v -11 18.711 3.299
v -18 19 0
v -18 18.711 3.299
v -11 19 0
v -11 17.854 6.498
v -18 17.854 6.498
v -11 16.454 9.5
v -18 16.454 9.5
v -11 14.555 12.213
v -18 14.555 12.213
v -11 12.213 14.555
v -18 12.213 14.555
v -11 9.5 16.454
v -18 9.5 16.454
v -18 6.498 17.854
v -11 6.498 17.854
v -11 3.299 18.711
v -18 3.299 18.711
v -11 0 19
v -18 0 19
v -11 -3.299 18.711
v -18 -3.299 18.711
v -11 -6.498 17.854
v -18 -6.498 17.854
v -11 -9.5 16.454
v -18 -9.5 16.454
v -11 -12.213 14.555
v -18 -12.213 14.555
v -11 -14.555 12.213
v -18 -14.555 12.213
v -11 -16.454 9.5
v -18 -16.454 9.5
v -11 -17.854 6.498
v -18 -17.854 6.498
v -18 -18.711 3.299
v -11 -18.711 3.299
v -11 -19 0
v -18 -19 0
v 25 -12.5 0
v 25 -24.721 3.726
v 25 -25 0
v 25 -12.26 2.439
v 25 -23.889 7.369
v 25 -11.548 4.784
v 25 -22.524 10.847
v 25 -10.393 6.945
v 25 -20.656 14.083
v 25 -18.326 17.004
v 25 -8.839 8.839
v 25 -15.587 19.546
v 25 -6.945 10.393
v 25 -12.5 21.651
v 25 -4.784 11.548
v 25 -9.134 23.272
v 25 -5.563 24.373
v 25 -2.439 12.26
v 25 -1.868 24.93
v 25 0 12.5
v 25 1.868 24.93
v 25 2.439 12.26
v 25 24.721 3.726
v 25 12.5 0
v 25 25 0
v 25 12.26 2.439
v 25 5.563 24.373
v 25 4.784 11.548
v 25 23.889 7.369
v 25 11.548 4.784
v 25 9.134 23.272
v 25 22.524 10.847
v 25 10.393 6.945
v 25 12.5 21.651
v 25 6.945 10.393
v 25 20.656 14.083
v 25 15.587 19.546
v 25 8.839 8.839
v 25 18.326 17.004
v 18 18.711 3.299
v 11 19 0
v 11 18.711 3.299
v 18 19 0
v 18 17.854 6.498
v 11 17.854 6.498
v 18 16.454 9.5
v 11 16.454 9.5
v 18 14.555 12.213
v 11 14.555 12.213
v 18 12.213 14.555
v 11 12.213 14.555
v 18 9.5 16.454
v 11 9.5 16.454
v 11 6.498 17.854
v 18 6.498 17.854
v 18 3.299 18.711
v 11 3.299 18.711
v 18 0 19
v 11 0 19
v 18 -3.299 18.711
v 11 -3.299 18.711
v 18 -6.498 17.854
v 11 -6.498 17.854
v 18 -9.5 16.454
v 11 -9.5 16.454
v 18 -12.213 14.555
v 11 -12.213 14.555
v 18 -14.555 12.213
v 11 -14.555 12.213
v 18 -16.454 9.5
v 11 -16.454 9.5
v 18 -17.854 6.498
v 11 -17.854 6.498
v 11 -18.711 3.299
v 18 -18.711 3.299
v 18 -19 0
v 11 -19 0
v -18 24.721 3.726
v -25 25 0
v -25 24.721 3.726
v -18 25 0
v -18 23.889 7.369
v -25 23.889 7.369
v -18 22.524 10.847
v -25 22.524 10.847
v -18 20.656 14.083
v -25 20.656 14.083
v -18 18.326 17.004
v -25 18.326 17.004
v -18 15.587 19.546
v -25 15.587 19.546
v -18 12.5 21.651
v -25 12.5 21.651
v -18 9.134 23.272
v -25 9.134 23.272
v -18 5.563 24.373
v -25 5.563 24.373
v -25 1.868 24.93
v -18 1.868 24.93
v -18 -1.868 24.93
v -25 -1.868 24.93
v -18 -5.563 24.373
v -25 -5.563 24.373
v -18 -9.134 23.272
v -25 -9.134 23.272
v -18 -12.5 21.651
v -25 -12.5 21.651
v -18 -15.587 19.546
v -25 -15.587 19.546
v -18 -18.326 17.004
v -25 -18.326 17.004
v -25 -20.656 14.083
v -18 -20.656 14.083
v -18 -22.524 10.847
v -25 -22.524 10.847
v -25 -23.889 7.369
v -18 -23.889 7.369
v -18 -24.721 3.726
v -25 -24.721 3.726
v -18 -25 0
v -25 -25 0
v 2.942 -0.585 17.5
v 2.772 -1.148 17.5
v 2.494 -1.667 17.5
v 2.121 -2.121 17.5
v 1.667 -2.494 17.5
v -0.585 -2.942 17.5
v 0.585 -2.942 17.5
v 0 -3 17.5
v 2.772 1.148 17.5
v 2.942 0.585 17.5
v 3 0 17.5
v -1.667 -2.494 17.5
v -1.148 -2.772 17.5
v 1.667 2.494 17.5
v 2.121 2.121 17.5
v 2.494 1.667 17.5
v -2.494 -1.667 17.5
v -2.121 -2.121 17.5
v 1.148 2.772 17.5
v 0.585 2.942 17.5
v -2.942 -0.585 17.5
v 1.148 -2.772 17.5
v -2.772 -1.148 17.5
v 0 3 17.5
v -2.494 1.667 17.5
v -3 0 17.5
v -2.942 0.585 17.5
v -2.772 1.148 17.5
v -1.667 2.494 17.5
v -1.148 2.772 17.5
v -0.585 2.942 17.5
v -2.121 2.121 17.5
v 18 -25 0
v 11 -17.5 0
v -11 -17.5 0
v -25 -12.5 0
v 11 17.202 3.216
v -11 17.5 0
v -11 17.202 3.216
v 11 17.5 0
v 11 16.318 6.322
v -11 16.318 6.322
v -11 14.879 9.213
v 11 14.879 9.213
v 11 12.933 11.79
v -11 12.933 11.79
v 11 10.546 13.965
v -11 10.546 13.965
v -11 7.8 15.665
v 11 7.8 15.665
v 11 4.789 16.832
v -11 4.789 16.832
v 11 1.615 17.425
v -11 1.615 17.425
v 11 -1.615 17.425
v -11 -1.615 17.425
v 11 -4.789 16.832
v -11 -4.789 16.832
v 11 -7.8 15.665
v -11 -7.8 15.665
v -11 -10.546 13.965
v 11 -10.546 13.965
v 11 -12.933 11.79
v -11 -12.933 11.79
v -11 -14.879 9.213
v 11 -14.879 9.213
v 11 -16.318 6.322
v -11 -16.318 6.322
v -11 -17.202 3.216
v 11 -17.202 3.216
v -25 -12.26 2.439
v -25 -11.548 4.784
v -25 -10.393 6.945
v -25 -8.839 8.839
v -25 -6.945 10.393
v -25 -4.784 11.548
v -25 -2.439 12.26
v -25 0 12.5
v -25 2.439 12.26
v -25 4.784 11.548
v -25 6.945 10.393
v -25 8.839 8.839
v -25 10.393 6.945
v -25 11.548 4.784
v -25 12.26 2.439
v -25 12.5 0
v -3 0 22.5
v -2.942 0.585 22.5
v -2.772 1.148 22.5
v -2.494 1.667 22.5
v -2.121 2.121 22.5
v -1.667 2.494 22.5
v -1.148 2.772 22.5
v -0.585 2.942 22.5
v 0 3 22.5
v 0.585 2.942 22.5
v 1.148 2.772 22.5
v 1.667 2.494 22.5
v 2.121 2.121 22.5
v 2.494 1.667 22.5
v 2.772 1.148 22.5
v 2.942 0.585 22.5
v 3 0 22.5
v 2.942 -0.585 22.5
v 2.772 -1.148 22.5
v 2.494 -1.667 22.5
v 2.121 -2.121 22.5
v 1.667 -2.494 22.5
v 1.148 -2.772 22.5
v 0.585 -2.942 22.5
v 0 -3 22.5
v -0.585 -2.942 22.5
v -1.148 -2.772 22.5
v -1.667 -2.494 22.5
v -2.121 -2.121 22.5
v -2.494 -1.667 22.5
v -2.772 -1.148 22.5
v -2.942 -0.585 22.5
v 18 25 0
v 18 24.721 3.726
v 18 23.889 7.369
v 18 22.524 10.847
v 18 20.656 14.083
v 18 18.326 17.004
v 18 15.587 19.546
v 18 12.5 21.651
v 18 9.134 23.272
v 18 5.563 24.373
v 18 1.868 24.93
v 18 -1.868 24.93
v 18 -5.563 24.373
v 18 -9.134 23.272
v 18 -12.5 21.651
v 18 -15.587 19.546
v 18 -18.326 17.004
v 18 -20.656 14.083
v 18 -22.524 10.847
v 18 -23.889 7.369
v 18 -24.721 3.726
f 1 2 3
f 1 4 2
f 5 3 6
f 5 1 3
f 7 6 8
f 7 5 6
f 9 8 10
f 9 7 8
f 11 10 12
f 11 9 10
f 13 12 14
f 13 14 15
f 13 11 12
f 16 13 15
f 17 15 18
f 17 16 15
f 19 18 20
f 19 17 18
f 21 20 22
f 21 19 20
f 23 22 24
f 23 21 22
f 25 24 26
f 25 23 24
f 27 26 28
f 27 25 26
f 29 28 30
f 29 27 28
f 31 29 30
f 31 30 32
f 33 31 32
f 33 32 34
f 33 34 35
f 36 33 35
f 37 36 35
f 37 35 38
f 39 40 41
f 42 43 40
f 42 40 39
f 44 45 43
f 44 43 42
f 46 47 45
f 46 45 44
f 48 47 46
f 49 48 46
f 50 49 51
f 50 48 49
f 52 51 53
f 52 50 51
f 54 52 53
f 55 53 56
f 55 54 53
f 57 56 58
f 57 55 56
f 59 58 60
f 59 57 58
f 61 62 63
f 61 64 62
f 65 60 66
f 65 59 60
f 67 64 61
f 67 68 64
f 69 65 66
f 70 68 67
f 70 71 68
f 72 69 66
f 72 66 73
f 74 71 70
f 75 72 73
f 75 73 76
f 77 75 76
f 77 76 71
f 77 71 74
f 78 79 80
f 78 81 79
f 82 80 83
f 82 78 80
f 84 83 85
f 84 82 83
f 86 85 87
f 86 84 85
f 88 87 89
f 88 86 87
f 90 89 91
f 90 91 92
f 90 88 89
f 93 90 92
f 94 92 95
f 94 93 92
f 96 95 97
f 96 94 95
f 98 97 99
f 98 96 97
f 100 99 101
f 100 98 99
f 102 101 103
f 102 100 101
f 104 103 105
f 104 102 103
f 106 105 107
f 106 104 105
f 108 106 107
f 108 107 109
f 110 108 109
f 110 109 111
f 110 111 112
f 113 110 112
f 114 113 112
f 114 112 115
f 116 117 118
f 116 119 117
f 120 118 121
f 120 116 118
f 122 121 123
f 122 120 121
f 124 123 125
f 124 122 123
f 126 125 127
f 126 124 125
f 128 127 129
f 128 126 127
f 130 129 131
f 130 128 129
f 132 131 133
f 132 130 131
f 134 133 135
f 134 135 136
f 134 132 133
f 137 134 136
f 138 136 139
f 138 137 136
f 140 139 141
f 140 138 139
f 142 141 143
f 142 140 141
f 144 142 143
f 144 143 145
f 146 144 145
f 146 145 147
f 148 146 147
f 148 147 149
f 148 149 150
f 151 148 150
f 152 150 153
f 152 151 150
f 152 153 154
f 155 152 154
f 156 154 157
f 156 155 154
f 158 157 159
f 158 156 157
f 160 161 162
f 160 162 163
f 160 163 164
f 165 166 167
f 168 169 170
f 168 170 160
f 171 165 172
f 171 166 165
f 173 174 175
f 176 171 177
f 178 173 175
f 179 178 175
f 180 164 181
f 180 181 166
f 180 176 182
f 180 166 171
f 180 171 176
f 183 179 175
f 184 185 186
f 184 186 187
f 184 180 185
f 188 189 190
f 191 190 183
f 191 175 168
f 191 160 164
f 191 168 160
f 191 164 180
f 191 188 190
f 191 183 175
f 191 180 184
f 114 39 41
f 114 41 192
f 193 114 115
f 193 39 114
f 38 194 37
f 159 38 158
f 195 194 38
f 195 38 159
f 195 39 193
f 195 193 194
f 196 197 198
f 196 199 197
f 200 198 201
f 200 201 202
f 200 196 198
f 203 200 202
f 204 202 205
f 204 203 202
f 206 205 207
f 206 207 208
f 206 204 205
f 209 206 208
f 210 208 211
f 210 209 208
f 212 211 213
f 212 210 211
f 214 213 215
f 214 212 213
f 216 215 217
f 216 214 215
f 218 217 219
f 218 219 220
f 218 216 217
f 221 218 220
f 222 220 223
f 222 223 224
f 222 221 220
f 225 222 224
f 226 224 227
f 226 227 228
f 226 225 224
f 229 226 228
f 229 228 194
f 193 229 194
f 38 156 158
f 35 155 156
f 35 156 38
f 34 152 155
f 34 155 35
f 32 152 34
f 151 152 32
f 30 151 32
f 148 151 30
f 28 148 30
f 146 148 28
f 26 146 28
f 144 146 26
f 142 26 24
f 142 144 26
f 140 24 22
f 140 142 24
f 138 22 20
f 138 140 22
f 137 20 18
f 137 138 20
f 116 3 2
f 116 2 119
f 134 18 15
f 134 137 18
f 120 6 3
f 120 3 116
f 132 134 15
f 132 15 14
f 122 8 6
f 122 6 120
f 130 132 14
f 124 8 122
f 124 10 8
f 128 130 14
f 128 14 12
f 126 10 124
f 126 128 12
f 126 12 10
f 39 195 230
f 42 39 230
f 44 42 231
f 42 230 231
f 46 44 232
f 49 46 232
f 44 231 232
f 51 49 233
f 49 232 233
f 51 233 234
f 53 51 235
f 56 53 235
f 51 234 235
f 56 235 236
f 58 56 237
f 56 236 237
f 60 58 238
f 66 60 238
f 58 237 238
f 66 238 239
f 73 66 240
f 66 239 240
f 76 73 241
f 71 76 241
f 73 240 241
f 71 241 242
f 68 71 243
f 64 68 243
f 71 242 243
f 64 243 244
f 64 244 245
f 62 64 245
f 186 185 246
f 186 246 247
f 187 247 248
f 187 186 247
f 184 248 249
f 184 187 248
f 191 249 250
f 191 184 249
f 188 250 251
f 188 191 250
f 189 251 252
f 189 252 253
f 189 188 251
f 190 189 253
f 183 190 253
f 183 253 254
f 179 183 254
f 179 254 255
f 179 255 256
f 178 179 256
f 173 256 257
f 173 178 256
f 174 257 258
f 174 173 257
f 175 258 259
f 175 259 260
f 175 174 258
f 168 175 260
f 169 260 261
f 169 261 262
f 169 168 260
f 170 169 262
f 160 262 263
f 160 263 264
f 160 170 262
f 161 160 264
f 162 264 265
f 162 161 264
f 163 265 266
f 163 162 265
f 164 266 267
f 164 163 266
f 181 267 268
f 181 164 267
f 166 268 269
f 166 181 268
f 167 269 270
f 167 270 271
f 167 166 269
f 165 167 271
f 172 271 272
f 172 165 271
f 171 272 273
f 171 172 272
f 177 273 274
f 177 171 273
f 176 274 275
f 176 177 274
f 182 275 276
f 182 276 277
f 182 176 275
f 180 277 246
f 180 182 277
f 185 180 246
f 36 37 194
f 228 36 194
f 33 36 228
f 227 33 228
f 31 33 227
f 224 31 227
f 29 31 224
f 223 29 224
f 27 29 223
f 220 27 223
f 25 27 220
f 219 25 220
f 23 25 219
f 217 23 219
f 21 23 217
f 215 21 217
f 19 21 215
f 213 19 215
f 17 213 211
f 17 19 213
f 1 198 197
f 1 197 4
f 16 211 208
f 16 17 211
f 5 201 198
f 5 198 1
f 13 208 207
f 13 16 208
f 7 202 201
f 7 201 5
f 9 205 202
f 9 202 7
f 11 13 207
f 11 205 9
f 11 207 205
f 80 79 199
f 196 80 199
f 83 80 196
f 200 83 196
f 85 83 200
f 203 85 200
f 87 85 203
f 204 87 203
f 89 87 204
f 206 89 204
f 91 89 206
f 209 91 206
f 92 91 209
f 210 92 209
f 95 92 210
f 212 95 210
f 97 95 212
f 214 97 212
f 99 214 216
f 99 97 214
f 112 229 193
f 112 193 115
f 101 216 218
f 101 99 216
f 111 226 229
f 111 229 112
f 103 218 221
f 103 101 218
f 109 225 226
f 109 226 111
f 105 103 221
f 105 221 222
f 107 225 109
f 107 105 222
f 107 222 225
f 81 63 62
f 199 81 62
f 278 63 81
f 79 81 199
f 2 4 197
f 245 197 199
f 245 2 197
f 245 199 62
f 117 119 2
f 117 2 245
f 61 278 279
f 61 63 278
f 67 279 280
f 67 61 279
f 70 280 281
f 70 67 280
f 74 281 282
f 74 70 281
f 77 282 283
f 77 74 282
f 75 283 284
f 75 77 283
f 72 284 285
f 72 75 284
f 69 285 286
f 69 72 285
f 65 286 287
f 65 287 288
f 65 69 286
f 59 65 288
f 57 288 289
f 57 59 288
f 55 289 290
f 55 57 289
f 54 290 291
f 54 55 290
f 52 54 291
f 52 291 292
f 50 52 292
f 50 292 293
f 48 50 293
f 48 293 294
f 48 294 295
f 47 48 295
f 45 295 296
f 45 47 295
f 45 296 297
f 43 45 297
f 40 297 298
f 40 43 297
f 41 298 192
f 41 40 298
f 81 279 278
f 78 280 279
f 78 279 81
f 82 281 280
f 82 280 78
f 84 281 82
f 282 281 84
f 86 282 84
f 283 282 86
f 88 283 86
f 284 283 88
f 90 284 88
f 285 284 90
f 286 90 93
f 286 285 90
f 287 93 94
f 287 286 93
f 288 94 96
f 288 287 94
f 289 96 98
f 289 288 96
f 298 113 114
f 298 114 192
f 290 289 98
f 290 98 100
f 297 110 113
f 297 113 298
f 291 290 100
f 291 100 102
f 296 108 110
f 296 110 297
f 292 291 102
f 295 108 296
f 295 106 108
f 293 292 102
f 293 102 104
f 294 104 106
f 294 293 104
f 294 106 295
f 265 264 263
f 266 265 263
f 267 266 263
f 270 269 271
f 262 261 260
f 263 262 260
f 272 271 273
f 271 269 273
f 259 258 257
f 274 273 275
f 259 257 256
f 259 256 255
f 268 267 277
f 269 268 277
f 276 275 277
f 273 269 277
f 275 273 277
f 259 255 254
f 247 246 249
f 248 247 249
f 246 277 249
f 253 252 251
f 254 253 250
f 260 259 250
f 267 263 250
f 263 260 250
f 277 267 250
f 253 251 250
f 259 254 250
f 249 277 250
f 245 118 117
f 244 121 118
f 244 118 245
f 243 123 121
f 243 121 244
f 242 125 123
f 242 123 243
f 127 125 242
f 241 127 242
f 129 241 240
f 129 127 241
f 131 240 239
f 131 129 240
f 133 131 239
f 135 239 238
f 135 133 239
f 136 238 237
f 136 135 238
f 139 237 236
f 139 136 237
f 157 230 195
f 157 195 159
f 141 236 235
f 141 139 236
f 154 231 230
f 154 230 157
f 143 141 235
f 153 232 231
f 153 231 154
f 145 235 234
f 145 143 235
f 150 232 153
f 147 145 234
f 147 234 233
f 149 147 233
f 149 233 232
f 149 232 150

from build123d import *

# Parameters (mm, degrees)
REVOLVE1_ANGLE      = 180
CUT_EXTRUDE3_DEPTH  = 50
SKETCH4_R           = 3
BOSS_EXTRUDE1_DEPTH = 5


with BuildPart() as part:
    # Sketch1 → Revolve1 (revolve)
    with BuildSketch(Plane.XY):
        Polygon((25, 0), (-25, 0), (-25, 25), (-18, 25), (-18, 19), (-11, 19), (-11, 17.5), (11, 17.5), (11, 19), (18, 19), (18, 25), (25, 25), align=None)
    revolve(axis=Axis((-38.949360705, 0, 0), (1, 0, 0)), revolution_arc=REVOLVE1_ANGLE)

    # Sketch2 → Cut-Extrude3 (cut)
    with BuildSketch(Plane.ZY.offset(25)):
        with BuildLine():
            Line((0, 12.5), (0, -12.5))
            ThreePointArc((0, -12.5), (12.5, 0), (0, 12.5))
        make_face()
    extrude(amount=-CUT_EXTRUDE3_DEPTH, mode=Mode.SUBTRACT)


with BuildPart() as body_2:
    # Sketch4 → Boss-Extrude1 (new body)
    with BuildSketch(Plane(origin=(0, 0, 17.5), x_dir=(-1, 0, 0), z_dir=(0, 0, -1))):
        Circle(SKETCH4_R)
    extrude(amount=-BOSS_EXTRUDE1_DEPTH)


solid = Compound([part.part, body_2.part])
